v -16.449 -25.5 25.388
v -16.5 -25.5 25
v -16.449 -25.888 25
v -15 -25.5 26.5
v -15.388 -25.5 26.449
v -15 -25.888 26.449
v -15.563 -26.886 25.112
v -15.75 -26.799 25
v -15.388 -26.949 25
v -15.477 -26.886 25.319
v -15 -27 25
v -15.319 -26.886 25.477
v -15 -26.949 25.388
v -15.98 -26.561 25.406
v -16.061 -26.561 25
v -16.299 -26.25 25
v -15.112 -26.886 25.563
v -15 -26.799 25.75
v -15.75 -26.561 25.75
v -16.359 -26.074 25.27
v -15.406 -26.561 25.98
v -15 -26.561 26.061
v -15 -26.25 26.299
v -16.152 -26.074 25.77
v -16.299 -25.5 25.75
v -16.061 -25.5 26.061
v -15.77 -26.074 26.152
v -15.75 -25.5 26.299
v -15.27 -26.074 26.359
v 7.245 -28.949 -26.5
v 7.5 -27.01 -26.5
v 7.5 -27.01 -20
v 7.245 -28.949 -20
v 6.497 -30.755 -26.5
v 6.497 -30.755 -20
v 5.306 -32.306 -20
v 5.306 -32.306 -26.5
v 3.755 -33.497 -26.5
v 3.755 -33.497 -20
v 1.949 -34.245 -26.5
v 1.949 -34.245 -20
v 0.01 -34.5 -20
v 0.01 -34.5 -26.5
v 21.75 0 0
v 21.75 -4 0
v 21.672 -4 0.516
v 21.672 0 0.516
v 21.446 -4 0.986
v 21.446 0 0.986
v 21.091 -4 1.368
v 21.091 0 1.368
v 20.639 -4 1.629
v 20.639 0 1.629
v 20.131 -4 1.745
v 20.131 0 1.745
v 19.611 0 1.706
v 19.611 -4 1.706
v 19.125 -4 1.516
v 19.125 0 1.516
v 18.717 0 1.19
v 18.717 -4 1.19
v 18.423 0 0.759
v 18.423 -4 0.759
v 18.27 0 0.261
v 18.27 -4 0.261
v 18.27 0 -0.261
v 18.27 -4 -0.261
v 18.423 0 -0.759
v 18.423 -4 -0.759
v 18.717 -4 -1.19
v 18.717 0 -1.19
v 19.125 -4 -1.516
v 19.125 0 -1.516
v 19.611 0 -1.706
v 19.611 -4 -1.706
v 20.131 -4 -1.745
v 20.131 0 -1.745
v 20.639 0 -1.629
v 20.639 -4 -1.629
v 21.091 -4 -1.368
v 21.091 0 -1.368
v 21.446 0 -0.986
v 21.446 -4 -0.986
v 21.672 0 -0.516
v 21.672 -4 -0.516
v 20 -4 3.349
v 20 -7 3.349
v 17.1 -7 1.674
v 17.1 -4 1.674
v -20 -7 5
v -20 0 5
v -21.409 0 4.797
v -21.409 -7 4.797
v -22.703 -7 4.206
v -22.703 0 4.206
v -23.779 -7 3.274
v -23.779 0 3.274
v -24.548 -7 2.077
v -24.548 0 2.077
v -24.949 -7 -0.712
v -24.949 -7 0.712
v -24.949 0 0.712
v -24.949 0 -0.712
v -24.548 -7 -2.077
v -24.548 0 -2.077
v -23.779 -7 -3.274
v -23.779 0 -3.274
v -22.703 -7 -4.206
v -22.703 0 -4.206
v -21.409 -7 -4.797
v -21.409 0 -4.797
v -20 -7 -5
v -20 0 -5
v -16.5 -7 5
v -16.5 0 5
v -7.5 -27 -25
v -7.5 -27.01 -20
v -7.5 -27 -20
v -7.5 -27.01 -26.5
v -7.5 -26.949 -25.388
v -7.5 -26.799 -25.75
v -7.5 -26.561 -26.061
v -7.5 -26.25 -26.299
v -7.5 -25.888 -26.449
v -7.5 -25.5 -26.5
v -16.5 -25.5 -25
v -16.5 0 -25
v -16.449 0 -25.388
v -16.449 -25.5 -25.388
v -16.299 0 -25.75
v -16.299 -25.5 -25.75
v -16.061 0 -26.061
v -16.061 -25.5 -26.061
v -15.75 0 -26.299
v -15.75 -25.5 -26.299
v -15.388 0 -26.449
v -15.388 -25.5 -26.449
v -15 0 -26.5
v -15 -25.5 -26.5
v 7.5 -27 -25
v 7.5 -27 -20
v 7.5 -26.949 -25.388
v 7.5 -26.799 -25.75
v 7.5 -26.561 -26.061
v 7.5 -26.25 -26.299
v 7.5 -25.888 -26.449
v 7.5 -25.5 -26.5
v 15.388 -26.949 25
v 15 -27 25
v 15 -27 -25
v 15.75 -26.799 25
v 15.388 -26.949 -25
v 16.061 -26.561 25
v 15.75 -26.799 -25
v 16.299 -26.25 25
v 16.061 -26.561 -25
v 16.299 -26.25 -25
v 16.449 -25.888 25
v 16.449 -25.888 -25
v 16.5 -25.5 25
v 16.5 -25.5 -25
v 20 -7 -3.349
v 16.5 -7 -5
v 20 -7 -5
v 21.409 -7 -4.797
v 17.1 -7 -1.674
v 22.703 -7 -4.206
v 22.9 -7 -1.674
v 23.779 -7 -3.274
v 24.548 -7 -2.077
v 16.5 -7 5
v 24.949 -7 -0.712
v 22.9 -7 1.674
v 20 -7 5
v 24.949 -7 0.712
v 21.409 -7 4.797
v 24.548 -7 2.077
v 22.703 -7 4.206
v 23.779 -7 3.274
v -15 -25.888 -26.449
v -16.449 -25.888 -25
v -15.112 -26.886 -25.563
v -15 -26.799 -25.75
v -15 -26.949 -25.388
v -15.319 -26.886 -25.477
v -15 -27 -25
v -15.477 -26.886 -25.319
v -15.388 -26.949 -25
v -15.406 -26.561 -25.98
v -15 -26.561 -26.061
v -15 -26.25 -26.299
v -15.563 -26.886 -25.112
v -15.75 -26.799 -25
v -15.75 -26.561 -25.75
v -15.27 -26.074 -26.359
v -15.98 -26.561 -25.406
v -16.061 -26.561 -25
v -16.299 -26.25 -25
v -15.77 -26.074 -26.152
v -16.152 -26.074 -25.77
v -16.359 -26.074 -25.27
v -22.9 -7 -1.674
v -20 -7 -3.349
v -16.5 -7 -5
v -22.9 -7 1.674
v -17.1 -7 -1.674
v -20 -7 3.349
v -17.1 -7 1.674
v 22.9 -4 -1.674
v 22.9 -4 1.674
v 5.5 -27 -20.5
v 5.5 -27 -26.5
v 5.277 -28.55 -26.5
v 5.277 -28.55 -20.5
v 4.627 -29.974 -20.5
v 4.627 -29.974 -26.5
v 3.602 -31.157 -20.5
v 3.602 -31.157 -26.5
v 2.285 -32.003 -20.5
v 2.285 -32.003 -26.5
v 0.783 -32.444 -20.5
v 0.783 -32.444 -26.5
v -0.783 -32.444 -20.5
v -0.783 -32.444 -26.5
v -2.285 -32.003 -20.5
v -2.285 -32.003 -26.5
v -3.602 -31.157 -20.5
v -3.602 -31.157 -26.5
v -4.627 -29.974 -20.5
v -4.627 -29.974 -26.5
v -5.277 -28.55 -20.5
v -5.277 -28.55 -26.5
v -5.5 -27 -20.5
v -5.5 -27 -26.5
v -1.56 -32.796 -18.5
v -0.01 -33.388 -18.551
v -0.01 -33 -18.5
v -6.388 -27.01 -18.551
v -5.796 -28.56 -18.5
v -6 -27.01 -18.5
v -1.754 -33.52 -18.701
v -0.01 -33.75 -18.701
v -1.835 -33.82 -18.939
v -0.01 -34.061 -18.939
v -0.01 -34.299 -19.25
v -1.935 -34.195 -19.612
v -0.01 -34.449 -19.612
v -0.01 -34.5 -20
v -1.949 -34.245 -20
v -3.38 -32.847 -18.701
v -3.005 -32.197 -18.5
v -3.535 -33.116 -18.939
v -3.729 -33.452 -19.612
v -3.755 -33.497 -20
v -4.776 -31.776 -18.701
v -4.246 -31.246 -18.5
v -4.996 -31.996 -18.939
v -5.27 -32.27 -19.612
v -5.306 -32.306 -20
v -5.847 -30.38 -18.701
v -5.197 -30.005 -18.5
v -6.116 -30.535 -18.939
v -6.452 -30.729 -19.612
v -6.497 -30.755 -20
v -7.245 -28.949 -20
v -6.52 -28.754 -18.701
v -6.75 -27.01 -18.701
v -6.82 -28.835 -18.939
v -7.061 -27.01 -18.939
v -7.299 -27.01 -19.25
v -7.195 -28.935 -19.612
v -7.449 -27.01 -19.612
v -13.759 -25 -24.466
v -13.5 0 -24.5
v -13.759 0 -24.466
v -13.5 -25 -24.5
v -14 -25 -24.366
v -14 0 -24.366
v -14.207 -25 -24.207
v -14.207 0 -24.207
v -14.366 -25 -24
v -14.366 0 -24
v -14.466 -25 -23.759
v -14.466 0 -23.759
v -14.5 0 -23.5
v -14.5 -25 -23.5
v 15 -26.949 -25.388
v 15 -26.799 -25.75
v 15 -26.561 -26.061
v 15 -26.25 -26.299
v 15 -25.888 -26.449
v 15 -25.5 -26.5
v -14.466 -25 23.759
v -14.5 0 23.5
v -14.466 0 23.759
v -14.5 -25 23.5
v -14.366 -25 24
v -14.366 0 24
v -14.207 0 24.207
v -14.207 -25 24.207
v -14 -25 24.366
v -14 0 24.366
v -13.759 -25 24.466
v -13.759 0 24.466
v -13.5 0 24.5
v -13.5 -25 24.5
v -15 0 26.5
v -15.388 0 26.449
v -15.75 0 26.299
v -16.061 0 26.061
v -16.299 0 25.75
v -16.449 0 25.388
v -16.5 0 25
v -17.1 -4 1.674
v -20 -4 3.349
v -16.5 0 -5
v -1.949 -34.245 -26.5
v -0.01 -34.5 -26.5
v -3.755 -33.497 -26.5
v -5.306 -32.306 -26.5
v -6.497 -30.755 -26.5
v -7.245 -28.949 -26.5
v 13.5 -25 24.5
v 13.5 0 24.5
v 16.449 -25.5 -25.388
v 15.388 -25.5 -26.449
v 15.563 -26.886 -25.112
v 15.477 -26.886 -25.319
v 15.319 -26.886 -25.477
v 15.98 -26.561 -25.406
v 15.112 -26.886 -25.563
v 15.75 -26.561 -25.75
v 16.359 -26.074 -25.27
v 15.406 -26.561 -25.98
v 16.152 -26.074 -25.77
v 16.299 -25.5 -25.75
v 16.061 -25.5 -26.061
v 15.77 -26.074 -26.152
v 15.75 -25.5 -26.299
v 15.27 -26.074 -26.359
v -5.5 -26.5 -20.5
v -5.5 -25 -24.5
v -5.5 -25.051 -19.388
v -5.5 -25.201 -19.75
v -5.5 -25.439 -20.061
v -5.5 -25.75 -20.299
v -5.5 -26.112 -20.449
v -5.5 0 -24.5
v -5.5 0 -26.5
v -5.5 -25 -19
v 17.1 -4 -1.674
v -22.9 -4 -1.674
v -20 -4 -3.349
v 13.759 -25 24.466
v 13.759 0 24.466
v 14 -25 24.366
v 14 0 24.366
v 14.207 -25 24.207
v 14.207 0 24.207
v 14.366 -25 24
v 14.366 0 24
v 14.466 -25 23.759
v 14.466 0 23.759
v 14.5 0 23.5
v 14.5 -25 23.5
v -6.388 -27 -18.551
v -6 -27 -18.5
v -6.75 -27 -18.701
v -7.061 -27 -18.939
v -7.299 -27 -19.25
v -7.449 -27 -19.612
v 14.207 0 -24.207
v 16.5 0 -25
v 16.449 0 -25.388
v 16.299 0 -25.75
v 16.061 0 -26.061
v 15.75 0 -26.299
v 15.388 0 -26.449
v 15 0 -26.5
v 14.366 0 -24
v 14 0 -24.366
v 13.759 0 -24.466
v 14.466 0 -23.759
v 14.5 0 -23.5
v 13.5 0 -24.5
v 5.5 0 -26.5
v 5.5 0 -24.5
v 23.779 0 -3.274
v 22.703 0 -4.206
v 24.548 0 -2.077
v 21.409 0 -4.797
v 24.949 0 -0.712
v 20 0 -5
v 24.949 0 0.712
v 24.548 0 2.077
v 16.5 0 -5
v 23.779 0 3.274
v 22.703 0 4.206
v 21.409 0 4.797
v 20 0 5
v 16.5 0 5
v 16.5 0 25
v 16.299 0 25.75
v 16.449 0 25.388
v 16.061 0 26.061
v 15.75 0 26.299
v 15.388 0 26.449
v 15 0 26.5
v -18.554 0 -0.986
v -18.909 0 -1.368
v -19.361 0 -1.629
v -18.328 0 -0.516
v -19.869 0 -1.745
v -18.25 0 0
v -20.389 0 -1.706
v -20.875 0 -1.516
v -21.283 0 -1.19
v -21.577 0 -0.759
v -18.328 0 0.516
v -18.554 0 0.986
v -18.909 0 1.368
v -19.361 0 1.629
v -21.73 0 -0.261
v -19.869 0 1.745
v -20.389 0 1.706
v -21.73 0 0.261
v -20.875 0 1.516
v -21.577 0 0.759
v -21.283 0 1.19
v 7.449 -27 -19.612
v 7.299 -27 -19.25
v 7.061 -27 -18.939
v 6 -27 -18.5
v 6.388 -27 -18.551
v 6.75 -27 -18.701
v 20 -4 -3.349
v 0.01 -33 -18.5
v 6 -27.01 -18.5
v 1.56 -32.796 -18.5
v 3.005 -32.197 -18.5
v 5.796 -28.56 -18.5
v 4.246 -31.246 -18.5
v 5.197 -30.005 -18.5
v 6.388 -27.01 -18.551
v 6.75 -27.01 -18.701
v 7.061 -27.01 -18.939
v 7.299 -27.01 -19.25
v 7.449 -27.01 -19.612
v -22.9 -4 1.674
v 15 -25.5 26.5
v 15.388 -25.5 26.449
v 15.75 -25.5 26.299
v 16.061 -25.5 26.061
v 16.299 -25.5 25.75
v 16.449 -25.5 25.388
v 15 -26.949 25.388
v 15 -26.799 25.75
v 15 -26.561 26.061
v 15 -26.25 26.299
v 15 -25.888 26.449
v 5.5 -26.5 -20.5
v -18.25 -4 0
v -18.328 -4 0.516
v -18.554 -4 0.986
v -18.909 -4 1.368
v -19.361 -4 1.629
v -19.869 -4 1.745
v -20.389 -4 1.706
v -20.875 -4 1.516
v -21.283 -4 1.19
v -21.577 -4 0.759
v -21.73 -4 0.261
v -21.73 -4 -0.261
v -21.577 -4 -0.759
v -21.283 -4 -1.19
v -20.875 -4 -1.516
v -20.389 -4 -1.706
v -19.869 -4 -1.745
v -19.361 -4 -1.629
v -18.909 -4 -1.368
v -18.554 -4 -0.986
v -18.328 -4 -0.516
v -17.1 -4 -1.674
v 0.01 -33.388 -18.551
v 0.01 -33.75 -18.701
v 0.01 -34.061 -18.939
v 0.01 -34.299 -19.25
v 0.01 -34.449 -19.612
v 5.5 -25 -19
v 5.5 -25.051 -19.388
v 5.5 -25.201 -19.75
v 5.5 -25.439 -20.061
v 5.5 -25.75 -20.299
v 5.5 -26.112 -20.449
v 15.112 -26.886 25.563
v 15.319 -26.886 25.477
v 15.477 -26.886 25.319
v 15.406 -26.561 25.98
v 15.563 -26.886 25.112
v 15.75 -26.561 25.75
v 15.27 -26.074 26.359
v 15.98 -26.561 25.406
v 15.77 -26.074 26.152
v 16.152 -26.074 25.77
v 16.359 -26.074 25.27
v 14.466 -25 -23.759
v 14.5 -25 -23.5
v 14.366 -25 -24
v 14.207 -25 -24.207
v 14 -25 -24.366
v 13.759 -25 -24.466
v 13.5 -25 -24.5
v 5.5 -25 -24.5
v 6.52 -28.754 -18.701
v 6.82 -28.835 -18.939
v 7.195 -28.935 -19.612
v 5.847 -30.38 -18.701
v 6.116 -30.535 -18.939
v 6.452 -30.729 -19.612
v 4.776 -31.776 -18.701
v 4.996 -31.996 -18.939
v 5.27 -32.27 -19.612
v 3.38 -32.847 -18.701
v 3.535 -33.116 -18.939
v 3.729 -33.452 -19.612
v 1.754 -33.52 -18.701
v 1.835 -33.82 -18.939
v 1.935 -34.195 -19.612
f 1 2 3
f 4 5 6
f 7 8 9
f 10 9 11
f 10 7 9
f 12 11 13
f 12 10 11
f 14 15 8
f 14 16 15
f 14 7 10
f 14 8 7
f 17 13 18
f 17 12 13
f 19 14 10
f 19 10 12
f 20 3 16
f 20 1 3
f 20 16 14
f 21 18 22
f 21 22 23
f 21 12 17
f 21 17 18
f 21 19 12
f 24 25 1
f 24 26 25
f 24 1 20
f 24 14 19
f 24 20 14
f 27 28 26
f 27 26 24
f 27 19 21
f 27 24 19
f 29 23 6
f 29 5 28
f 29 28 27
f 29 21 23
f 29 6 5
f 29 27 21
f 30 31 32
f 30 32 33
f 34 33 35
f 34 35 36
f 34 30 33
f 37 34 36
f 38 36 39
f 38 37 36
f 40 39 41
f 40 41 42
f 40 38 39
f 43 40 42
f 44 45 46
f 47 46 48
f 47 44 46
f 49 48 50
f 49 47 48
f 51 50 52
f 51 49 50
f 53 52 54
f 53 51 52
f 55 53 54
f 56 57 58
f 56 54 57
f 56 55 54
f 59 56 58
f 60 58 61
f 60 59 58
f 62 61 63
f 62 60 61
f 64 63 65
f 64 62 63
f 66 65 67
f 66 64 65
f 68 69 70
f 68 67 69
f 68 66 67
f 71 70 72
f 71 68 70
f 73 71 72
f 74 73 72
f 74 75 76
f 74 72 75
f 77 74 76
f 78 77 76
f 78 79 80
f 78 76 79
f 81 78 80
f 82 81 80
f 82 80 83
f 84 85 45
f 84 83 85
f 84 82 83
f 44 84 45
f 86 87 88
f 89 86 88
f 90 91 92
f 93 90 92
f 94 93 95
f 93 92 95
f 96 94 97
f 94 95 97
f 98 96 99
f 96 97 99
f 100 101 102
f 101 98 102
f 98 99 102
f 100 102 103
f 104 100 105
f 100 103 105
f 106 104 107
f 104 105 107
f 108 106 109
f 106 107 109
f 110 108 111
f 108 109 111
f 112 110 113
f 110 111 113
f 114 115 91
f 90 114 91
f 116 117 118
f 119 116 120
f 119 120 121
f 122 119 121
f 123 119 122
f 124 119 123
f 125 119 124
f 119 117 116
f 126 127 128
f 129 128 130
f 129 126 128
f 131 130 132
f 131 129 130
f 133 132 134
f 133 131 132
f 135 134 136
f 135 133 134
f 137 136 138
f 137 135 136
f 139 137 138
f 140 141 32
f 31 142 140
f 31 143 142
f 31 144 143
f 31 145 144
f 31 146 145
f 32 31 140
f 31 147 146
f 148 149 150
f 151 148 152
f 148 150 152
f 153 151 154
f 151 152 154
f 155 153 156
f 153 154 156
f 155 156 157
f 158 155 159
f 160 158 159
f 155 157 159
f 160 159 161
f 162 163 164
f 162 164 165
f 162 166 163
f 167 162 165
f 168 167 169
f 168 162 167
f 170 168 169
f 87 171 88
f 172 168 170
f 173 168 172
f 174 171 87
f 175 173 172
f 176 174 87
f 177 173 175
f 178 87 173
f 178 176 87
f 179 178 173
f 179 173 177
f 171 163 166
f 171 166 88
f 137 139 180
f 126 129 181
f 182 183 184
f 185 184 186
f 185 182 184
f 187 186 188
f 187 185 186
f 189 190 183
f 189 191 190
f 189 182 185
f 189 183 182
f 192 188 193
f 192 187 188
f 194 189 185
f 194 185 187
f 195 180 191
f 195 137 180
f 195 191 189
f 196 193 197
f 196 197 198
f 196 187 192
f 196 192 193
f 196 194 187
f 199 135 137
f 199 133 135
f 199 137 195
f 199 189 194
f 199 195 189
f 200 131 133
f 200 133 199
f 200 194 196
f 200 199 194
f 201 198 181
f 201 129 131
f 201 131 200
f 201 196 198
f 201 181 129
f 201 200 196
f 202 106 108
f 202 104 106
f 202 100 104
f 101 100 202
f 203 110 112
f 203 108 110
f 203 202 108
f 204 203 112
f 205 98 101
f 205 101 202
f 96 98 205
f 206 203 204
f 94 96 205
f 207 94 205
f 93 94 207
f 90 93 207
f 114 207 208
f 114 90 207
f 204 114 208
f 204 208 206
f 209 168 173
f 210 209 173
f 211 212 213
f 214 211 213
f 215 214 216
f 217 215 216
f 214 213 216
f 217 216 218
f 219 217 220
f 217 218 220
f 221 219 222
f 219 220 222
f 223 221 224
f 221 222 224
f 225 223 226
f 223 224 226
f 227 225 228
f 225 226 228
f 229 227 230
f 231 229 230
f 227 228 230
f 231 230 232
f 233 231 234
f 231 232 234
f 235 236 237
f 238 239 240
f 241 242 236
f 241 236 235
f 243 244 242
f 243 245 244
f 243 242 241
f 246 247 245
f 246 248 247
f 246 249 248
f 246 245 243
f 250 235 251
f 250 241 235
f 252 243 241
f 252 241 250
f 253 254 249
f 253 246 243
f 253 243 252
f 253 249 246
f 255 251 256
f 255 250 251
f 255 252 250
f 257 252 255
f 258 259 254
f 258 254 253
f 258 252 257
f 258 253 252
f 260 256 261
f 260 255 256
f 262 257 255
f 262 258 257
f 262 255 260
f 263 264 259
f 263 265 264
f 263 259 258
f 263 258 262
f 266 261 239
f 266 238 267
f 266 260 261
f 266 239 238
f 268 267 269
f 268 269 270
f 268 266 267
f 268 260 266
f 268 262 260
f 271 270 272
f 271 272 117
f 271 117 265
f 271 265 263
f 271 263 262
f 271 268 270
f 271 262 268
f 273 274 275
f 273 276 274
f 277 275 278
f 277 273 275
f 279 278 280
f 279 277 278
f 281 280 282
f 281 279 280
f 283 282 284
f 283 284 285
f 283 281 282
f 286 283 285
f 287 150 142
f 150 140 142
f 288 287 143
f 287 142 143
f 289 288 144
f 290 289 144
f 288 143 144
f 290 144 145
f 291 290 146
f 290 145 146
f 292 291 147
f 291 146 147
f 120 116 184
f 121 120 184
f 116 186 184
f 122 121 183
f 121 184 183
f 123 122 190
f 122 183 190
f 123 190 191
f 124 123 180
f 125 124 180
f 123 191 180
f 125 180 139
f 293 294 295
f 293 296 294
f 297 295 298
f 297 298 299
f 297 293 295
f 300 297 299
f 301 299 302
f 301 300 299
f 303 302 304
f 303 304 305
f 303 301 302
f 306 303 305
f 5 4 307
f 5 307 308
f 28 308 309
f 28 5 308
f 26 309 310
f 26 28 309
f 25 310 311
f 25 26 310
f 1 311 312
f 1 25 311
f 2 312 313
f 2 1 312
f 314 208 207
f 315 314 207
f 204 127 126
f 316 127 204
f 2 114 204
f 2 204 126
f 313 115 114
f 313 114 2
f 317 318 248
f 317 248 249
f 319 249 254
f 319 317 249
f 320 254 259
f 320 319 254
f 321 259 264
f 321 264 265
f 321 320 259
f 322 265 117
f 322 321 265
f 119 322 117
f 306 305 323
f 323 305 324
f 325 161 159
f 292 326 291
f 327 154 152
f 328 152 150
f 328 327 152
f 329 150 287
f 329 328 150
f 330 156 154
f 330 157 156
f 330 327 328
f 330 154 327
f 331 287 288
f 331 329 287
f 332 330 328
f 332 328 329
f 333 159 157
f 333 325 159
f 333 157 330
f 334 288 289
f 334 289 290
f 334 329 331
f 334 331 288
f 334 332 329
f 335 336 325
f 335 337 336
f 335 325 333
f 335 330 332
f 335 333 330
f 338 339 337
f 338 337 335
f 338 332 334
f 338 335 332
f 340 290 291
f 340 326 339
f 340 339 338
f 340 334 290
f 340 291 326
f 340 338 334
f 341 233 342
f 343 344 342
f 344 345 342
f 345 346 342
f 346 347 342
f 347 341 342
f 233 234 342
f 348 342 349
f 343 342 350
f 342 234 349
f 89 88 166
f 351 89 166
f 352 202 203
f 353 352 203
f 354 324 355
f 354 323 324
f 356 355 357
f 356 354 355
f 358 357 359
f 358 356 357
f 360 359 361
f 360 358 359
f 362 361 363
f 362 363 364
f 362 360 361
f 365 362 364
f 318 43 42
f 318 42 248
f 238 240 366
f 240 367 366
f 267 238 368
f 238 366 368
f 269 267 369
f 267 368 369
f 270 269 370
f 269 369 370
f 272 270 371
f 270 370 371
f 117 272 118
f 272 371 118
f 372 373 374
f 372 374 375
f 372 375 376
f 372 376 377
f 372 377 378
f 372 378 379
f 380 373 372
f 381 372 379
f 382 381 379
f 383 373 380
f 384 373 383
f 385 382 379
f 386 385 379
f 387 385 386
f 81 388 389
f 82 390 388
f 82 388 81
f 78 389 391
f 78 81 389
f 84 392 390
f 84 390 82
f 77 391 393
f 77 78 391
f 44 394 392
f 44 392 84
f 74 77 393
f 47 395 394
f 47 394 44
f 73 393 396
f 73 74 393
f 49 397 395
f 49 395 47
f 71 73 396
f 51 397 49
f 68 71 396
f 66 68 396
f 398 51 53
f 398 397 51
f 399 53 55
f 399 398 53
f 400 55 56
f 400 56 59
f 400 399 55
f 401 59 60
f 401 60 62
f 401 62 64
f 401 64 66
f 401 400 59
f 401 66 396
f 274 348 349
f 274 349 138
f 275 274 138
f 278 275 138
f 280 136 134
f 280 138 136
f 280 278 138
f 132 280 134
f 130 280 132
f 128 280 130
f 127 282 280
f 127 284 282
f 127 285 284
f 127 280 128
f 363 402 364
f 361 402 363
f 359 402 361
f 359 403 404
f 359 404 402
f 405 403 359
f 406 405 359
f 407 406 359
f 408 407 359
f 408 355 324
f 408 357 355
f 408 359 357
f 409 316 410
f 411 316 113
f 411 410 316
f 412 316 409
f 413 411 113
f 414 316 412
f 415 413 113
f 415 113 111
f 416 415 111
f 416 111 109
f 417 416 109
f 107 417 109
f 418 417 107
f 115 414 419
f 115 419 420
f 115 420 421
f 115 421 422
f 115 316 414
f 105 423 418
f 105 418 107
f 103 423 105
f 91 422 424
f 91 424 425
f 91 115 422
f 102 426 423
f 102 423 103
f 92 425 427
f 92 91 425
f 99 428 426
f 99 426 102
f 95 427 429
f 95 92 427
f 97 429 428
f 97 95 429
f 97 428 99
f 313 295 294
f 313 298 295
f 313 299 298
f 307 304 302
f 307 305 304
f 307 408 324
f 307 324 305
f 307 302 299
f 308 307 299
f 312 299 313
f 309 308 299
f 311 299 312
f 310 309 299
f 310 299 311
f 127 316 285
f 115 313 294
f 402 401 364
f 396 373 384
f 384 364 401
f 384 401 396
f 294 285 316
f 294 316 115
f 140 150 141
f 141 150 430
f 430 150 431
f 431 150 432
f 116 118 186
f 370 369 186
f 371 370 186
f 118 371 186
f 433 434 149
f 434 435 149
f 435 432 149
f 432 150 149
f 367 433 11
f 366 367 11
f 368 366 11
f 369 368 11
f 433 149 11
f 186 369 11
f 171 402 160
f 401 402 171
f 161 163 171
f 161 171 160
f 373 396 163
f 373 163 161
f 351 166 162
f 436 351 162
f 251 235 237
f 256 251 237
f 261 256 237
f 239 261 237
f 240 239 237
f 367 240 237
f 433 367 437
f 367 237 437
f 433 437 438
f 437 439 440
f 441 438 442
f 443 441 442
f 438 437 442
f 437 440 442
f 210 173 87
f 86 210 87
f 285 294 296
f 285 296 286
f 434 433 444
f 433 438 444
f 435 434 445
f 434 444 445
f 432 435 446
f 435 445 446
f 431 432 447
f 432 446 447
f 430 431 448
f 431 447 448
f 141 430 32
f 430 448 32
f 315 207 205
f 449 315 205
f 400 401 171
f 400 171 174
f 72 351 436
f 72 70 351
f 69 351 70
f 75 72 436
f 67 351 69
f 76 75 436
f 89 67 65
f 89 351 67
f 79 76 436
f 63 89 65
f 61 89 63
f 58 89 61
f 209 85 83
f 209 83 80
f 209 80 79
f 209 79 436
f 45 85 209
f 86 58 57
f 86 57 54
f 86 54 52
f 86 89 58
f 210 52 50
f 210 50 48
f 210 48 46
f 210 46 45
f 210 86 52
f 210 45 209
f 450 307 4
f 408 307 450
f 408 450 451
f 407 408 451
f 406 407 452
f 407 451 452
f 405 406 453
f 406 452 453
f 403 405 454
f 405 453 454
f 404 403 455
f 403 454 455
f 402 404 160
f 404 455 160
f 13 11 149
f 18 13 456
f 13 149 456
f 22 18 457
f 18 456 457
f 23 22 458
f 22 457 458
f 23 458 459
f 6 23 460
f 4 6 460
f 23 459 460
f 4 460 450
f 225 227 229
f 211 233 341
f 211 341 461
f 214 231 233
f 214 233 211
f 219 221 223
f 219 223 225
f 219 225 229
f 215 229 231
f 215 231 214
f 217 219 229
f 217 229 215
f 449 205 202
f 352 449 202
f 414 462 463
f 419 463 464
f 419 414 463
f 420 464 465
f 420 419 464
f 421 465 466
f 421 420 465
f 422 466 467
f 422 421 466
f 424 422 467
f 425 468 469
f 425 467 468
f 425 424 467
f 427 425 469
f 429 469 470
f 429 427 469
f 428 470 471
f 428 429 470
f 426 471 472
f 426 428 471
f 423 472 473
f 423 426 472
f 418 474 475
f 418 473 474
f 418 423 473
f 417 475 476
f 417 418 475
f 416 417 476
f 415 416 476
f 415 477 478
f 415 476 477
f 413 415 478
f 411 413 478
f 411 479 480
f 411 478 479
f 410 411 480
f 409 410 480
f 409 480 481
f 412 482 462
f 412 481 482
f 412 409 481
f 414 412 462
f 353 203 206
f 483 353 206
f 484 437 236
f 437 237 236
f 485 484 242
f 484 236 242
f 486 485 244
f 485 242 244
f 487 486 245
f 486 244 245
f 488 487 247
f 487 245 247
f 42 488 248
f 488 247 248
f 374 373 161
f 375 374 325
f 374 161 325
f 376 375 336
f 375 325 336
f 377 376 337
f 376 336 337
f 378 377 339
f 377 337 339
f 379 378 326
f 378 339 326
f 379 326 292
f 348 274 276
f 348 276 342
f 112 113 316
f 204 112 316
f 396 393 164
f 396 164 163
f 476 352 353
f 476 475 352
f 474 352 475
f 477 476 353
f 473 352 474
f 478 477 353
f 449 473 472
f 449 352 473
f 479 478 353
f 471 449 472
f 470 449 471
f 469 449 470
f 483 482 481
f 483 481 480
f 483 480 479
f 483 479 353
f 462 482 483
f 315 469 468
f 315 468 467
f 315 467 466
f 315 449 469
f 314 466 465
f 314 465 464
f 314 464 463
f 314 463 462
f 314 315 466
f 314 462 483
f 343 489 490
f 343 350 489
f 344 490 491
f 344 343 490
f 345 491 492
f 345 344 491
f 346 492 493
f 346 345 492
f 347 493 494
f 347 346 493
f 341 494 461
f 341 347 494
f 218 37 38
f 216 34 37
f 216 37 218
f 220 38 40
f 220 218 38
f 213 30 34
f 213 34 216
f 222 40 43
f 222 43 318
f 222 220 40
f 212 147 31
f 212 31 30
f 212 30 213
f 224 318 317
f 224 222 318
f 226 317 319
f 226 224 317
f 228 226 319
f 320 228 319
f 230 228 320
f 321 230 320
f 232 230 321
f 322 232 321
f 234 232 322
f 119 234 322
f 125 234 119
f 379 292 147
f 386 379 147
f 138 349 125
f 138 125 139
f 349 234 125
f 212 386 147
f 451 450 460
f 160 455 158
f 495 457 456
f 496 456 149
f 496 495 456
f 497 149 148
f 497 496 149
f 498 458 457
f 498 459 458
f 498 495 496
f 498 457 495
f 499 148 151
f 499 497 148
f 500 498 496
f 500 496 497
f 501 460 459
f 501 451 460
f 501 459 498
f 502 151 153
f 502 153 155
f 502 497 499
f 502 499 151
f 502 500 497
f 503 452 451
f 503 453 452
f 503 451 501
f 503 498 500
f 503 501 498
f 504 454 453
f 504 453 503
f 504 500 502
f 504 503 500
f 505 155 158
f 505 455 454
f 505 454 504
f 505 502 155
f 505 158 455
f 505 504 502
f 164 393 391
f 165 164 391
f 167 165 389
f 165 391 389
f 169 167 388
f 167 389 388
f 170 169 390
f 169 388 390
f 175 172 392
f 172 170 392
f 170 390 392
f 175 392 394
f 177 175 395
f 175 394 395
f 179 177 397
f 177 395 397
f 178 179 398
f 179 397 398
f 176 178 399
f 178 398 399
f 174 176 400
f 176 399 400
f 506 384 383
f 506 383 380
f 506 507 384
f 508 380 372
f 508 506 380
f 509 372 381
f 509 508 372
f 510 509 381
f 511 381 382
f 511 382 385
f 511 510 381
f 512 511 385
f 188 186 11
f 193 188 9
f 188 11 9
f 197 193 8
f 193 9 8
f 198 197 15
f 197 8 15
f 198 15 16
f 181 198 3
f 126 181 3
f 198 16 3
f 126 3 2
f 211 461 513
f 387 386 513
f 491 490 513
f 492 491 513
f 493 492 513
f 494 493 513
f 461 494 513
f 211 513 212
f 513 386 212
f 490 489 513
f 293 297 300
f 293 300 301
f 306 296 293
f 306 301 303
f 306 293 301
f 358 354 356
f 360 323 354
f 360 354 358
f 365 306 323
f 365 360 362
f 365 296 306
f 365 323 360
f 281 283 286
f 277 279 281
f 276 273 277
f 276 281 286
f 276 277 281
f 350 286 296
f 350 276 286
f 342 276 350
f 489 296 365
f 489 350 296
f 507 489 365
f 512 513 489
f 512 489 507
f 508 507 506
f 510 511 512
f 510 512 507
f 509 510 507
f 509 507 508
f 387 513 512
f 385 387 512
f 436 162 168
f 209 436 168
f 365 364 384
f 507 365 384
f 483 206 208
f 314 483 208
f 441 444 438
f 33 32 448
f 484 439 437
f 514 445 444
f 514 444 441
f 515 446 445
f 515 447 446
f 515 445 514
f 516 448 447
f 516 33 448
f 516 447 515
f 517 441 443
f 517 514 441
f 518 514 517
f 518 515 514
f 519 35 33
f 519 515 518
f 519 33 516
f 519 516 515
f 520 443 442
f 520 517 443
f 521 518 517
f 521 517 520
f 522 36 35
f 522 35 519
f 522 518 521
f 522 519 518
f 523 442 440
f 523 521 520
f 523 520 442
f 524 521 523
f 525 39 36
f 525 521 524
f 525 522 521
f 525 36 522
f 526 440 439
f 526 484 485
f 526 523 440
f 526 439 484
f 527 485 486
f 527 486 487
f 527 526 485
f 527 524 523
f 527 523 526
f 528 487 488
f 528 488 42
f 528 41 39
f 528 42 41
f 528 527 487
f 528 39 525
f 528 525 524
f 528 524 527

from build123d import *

# Parameters (mm, degrees)
SKETCH_R        = 1.75
PAD_DEPTH       = 27
SKETCH001_W     = 29
SKETCH001_H     = 49
POCKET_DEPTH    = 25
SKETCH002_W     = 9
SKETCH002_H     = 10
POCKET001_DEPTH = 20
POCKET002_DEPTH = 3
PAD001_DEPTH    = 8
POCKET003_DEPTH = 6
FILLET_R        = 1.5
FILLET001_R     = 1.5
FILLET002_R     = 1.5
FILLET003_R     = 1


with BuildPart() as part:
    # Sketch → Pad (new body)
    with BuildSketch(Plane.XZ):
        with BuildLine():
            Line((-16.5, 26.5), (16.5, 26.5))
            Line((16.5, 26.5), (16.5, 5))
            Line((16.5, 5), (20, 5))
            ThreePointArc((20, -5), (25, 0), (20, 5))
            Line((20, -5), (16.5, -5))
            Line((16.5, -5), (16.5, -26.5))
            Line((16.5, -26.5), (-16.5, -26.5))
            Line((-16.5, -26.5), (-16.5, -5))
            Line((-20, -5), (-16.5, -5))
            ThreePointArc((-20, 5), (-25, 0), (-20, -5))
            Line((-16.5, 5), (-20, 5))
            Line((-16.5, 5), (-16.5, 26.5))
        make_face()
        with Locations((-20, 0)):
            Circle(SKETCH_R, mode=Mode.SUBTRACT)
        with Locations((20, 0)):
            Circle(SKETCH_R, mode=Mode.SUBTRACT)
    extrude(amount=PAD_DEPTH)

    # Sketch001 (on Face15 of Pad) → Pocket (cut)
    with BuildSketch(Plane(origin=(0, 0, 0), x_dir=(1, 0, 0), z_dir=(0, 1, 0))):
        Rectangle(SKETCH001_W, SKETCH001_H)
    extrude(amount=-POCKET_DEPTH, mode=Mode.SUBTRACT)

    # Sketch002 (on Face5 of Pocket) → Pocket001 (cut)
    with BuildSketch(Plane.XZ.offset(27)):
        with Locations((-21, 0)):
            Rectangle(SKETCH002_W, SKETCH002_H)
        with Locations((21, 0)):
            Rectangle(SKETCH002_W, SKETCH002_H)
    extrude(amount=-POCKET001_DEPTH, mode=Mode.SUBTRACT)

    # Sketch003 (on Face8 of Pocket001) → Pocket002 (cut)
    with BuildSketch(Plane.XZ.offset(7)):
        Polygon((-17.1, 1.674316), (-20, 3.348632), (-22.9, 1.674316), (-22.9, -1.674316), (-20, -3.348632), (-17.1, -1.674316), align=None)
        Polygon((22.9, 1.674316), (20, 3.348632), (17.1, 1.674316), (17.1, -1.674316), (20, -3.348632), (22.9, -1.674316), align=None)
    extrude(amount=-POCKET002_DEPTH, mode=Mode.SUBTRACT)

    # Sketch004 (on Face14 of Pocket002) → Pad001 (join)
    with BuildSketch(Plane(origin=(0, 0, -26.5), x_dir=(1, 0, 0), z_dir=(0, 0, -1))):
        with BuildLine():
            Line((-7.5, 27), (7.5, 27))
            Line((7.5, 27), (7.5, 27.01))
            ThreePointArc((7.5, 27.01), (5.30623, 32.30623), (0.01, 34.5))
            Line((0.01, 34.5), (-0.01, 34.5))
            ThreePointArc((-0.01, 34.5), (-5.30623, 32.30623), (-7.5, 27.01))
            Line((-7.5, 27.01), (-7.5, 27))
        make_face()
    extrude(amount=-PAD001_DEPTH)

    # Sketch005 (on Face14 of Pad001) → Pocket003 (cut)
    with BuildSketch(Plane(origin=(0, 0, -26.5), x_dir=(1, 0, 0), z_dir=(0, 0, -1))):
        with BuildLine():
            Line((-5.5, 0), (5.5, 0))
            Line((5.5, 0), (5.5, 27))
            ThreePointArc((5.5, 27), (0, 32.5), (-5.5, 27))
            Line((-5.5, 27), (-5.5, 0))
        make_face()
    extrude(amount=-POCKET003_DEPTH, mode=Mode.SUBTRACT)

    # Fillet
    fillet_edges = [part.edges().sort_by_distance(p)[0] for p in [
        (16.5, -13.5, 26.5),
        (-16.5, -13.5, 26.5),
        (-16.5, -13.5, -26.5),
        (16.5, -13.5, -26.5),
    ]]
    fillet(fillet_edges, radius=FILLET_R)

    # Fillet001
    fillet001_edges = [part.edges().sort_by_distance(p)[0] for p in [
        (-16.5, -27, -15),
    ]]
    fillet(fillet001_edges, radius=FILLET001_R)

    # Fillet002
    fillet002_edges = [part.edges().sort_by_distance(p)[0] for p in [
        (0, -25, -20.5),
        (5.30623, -32.30623, -18.5),
    ]]
    fillet(fillet002_edges, radius=FILLET002_R)

    # Fillet003
    fillet003_edges = [part.edges().sort_by_distance(p)[0] for p in [
        (14.5, -12.5, -24.5),
        (-14.5, -12.5, -24.5),
        (-14.5, -12.5, 24.5),
        (14.5, -12.5, 24.5),
    ]]
    fillet(fillet003_edges, radius=FILLET003_R)


solid = part.part
